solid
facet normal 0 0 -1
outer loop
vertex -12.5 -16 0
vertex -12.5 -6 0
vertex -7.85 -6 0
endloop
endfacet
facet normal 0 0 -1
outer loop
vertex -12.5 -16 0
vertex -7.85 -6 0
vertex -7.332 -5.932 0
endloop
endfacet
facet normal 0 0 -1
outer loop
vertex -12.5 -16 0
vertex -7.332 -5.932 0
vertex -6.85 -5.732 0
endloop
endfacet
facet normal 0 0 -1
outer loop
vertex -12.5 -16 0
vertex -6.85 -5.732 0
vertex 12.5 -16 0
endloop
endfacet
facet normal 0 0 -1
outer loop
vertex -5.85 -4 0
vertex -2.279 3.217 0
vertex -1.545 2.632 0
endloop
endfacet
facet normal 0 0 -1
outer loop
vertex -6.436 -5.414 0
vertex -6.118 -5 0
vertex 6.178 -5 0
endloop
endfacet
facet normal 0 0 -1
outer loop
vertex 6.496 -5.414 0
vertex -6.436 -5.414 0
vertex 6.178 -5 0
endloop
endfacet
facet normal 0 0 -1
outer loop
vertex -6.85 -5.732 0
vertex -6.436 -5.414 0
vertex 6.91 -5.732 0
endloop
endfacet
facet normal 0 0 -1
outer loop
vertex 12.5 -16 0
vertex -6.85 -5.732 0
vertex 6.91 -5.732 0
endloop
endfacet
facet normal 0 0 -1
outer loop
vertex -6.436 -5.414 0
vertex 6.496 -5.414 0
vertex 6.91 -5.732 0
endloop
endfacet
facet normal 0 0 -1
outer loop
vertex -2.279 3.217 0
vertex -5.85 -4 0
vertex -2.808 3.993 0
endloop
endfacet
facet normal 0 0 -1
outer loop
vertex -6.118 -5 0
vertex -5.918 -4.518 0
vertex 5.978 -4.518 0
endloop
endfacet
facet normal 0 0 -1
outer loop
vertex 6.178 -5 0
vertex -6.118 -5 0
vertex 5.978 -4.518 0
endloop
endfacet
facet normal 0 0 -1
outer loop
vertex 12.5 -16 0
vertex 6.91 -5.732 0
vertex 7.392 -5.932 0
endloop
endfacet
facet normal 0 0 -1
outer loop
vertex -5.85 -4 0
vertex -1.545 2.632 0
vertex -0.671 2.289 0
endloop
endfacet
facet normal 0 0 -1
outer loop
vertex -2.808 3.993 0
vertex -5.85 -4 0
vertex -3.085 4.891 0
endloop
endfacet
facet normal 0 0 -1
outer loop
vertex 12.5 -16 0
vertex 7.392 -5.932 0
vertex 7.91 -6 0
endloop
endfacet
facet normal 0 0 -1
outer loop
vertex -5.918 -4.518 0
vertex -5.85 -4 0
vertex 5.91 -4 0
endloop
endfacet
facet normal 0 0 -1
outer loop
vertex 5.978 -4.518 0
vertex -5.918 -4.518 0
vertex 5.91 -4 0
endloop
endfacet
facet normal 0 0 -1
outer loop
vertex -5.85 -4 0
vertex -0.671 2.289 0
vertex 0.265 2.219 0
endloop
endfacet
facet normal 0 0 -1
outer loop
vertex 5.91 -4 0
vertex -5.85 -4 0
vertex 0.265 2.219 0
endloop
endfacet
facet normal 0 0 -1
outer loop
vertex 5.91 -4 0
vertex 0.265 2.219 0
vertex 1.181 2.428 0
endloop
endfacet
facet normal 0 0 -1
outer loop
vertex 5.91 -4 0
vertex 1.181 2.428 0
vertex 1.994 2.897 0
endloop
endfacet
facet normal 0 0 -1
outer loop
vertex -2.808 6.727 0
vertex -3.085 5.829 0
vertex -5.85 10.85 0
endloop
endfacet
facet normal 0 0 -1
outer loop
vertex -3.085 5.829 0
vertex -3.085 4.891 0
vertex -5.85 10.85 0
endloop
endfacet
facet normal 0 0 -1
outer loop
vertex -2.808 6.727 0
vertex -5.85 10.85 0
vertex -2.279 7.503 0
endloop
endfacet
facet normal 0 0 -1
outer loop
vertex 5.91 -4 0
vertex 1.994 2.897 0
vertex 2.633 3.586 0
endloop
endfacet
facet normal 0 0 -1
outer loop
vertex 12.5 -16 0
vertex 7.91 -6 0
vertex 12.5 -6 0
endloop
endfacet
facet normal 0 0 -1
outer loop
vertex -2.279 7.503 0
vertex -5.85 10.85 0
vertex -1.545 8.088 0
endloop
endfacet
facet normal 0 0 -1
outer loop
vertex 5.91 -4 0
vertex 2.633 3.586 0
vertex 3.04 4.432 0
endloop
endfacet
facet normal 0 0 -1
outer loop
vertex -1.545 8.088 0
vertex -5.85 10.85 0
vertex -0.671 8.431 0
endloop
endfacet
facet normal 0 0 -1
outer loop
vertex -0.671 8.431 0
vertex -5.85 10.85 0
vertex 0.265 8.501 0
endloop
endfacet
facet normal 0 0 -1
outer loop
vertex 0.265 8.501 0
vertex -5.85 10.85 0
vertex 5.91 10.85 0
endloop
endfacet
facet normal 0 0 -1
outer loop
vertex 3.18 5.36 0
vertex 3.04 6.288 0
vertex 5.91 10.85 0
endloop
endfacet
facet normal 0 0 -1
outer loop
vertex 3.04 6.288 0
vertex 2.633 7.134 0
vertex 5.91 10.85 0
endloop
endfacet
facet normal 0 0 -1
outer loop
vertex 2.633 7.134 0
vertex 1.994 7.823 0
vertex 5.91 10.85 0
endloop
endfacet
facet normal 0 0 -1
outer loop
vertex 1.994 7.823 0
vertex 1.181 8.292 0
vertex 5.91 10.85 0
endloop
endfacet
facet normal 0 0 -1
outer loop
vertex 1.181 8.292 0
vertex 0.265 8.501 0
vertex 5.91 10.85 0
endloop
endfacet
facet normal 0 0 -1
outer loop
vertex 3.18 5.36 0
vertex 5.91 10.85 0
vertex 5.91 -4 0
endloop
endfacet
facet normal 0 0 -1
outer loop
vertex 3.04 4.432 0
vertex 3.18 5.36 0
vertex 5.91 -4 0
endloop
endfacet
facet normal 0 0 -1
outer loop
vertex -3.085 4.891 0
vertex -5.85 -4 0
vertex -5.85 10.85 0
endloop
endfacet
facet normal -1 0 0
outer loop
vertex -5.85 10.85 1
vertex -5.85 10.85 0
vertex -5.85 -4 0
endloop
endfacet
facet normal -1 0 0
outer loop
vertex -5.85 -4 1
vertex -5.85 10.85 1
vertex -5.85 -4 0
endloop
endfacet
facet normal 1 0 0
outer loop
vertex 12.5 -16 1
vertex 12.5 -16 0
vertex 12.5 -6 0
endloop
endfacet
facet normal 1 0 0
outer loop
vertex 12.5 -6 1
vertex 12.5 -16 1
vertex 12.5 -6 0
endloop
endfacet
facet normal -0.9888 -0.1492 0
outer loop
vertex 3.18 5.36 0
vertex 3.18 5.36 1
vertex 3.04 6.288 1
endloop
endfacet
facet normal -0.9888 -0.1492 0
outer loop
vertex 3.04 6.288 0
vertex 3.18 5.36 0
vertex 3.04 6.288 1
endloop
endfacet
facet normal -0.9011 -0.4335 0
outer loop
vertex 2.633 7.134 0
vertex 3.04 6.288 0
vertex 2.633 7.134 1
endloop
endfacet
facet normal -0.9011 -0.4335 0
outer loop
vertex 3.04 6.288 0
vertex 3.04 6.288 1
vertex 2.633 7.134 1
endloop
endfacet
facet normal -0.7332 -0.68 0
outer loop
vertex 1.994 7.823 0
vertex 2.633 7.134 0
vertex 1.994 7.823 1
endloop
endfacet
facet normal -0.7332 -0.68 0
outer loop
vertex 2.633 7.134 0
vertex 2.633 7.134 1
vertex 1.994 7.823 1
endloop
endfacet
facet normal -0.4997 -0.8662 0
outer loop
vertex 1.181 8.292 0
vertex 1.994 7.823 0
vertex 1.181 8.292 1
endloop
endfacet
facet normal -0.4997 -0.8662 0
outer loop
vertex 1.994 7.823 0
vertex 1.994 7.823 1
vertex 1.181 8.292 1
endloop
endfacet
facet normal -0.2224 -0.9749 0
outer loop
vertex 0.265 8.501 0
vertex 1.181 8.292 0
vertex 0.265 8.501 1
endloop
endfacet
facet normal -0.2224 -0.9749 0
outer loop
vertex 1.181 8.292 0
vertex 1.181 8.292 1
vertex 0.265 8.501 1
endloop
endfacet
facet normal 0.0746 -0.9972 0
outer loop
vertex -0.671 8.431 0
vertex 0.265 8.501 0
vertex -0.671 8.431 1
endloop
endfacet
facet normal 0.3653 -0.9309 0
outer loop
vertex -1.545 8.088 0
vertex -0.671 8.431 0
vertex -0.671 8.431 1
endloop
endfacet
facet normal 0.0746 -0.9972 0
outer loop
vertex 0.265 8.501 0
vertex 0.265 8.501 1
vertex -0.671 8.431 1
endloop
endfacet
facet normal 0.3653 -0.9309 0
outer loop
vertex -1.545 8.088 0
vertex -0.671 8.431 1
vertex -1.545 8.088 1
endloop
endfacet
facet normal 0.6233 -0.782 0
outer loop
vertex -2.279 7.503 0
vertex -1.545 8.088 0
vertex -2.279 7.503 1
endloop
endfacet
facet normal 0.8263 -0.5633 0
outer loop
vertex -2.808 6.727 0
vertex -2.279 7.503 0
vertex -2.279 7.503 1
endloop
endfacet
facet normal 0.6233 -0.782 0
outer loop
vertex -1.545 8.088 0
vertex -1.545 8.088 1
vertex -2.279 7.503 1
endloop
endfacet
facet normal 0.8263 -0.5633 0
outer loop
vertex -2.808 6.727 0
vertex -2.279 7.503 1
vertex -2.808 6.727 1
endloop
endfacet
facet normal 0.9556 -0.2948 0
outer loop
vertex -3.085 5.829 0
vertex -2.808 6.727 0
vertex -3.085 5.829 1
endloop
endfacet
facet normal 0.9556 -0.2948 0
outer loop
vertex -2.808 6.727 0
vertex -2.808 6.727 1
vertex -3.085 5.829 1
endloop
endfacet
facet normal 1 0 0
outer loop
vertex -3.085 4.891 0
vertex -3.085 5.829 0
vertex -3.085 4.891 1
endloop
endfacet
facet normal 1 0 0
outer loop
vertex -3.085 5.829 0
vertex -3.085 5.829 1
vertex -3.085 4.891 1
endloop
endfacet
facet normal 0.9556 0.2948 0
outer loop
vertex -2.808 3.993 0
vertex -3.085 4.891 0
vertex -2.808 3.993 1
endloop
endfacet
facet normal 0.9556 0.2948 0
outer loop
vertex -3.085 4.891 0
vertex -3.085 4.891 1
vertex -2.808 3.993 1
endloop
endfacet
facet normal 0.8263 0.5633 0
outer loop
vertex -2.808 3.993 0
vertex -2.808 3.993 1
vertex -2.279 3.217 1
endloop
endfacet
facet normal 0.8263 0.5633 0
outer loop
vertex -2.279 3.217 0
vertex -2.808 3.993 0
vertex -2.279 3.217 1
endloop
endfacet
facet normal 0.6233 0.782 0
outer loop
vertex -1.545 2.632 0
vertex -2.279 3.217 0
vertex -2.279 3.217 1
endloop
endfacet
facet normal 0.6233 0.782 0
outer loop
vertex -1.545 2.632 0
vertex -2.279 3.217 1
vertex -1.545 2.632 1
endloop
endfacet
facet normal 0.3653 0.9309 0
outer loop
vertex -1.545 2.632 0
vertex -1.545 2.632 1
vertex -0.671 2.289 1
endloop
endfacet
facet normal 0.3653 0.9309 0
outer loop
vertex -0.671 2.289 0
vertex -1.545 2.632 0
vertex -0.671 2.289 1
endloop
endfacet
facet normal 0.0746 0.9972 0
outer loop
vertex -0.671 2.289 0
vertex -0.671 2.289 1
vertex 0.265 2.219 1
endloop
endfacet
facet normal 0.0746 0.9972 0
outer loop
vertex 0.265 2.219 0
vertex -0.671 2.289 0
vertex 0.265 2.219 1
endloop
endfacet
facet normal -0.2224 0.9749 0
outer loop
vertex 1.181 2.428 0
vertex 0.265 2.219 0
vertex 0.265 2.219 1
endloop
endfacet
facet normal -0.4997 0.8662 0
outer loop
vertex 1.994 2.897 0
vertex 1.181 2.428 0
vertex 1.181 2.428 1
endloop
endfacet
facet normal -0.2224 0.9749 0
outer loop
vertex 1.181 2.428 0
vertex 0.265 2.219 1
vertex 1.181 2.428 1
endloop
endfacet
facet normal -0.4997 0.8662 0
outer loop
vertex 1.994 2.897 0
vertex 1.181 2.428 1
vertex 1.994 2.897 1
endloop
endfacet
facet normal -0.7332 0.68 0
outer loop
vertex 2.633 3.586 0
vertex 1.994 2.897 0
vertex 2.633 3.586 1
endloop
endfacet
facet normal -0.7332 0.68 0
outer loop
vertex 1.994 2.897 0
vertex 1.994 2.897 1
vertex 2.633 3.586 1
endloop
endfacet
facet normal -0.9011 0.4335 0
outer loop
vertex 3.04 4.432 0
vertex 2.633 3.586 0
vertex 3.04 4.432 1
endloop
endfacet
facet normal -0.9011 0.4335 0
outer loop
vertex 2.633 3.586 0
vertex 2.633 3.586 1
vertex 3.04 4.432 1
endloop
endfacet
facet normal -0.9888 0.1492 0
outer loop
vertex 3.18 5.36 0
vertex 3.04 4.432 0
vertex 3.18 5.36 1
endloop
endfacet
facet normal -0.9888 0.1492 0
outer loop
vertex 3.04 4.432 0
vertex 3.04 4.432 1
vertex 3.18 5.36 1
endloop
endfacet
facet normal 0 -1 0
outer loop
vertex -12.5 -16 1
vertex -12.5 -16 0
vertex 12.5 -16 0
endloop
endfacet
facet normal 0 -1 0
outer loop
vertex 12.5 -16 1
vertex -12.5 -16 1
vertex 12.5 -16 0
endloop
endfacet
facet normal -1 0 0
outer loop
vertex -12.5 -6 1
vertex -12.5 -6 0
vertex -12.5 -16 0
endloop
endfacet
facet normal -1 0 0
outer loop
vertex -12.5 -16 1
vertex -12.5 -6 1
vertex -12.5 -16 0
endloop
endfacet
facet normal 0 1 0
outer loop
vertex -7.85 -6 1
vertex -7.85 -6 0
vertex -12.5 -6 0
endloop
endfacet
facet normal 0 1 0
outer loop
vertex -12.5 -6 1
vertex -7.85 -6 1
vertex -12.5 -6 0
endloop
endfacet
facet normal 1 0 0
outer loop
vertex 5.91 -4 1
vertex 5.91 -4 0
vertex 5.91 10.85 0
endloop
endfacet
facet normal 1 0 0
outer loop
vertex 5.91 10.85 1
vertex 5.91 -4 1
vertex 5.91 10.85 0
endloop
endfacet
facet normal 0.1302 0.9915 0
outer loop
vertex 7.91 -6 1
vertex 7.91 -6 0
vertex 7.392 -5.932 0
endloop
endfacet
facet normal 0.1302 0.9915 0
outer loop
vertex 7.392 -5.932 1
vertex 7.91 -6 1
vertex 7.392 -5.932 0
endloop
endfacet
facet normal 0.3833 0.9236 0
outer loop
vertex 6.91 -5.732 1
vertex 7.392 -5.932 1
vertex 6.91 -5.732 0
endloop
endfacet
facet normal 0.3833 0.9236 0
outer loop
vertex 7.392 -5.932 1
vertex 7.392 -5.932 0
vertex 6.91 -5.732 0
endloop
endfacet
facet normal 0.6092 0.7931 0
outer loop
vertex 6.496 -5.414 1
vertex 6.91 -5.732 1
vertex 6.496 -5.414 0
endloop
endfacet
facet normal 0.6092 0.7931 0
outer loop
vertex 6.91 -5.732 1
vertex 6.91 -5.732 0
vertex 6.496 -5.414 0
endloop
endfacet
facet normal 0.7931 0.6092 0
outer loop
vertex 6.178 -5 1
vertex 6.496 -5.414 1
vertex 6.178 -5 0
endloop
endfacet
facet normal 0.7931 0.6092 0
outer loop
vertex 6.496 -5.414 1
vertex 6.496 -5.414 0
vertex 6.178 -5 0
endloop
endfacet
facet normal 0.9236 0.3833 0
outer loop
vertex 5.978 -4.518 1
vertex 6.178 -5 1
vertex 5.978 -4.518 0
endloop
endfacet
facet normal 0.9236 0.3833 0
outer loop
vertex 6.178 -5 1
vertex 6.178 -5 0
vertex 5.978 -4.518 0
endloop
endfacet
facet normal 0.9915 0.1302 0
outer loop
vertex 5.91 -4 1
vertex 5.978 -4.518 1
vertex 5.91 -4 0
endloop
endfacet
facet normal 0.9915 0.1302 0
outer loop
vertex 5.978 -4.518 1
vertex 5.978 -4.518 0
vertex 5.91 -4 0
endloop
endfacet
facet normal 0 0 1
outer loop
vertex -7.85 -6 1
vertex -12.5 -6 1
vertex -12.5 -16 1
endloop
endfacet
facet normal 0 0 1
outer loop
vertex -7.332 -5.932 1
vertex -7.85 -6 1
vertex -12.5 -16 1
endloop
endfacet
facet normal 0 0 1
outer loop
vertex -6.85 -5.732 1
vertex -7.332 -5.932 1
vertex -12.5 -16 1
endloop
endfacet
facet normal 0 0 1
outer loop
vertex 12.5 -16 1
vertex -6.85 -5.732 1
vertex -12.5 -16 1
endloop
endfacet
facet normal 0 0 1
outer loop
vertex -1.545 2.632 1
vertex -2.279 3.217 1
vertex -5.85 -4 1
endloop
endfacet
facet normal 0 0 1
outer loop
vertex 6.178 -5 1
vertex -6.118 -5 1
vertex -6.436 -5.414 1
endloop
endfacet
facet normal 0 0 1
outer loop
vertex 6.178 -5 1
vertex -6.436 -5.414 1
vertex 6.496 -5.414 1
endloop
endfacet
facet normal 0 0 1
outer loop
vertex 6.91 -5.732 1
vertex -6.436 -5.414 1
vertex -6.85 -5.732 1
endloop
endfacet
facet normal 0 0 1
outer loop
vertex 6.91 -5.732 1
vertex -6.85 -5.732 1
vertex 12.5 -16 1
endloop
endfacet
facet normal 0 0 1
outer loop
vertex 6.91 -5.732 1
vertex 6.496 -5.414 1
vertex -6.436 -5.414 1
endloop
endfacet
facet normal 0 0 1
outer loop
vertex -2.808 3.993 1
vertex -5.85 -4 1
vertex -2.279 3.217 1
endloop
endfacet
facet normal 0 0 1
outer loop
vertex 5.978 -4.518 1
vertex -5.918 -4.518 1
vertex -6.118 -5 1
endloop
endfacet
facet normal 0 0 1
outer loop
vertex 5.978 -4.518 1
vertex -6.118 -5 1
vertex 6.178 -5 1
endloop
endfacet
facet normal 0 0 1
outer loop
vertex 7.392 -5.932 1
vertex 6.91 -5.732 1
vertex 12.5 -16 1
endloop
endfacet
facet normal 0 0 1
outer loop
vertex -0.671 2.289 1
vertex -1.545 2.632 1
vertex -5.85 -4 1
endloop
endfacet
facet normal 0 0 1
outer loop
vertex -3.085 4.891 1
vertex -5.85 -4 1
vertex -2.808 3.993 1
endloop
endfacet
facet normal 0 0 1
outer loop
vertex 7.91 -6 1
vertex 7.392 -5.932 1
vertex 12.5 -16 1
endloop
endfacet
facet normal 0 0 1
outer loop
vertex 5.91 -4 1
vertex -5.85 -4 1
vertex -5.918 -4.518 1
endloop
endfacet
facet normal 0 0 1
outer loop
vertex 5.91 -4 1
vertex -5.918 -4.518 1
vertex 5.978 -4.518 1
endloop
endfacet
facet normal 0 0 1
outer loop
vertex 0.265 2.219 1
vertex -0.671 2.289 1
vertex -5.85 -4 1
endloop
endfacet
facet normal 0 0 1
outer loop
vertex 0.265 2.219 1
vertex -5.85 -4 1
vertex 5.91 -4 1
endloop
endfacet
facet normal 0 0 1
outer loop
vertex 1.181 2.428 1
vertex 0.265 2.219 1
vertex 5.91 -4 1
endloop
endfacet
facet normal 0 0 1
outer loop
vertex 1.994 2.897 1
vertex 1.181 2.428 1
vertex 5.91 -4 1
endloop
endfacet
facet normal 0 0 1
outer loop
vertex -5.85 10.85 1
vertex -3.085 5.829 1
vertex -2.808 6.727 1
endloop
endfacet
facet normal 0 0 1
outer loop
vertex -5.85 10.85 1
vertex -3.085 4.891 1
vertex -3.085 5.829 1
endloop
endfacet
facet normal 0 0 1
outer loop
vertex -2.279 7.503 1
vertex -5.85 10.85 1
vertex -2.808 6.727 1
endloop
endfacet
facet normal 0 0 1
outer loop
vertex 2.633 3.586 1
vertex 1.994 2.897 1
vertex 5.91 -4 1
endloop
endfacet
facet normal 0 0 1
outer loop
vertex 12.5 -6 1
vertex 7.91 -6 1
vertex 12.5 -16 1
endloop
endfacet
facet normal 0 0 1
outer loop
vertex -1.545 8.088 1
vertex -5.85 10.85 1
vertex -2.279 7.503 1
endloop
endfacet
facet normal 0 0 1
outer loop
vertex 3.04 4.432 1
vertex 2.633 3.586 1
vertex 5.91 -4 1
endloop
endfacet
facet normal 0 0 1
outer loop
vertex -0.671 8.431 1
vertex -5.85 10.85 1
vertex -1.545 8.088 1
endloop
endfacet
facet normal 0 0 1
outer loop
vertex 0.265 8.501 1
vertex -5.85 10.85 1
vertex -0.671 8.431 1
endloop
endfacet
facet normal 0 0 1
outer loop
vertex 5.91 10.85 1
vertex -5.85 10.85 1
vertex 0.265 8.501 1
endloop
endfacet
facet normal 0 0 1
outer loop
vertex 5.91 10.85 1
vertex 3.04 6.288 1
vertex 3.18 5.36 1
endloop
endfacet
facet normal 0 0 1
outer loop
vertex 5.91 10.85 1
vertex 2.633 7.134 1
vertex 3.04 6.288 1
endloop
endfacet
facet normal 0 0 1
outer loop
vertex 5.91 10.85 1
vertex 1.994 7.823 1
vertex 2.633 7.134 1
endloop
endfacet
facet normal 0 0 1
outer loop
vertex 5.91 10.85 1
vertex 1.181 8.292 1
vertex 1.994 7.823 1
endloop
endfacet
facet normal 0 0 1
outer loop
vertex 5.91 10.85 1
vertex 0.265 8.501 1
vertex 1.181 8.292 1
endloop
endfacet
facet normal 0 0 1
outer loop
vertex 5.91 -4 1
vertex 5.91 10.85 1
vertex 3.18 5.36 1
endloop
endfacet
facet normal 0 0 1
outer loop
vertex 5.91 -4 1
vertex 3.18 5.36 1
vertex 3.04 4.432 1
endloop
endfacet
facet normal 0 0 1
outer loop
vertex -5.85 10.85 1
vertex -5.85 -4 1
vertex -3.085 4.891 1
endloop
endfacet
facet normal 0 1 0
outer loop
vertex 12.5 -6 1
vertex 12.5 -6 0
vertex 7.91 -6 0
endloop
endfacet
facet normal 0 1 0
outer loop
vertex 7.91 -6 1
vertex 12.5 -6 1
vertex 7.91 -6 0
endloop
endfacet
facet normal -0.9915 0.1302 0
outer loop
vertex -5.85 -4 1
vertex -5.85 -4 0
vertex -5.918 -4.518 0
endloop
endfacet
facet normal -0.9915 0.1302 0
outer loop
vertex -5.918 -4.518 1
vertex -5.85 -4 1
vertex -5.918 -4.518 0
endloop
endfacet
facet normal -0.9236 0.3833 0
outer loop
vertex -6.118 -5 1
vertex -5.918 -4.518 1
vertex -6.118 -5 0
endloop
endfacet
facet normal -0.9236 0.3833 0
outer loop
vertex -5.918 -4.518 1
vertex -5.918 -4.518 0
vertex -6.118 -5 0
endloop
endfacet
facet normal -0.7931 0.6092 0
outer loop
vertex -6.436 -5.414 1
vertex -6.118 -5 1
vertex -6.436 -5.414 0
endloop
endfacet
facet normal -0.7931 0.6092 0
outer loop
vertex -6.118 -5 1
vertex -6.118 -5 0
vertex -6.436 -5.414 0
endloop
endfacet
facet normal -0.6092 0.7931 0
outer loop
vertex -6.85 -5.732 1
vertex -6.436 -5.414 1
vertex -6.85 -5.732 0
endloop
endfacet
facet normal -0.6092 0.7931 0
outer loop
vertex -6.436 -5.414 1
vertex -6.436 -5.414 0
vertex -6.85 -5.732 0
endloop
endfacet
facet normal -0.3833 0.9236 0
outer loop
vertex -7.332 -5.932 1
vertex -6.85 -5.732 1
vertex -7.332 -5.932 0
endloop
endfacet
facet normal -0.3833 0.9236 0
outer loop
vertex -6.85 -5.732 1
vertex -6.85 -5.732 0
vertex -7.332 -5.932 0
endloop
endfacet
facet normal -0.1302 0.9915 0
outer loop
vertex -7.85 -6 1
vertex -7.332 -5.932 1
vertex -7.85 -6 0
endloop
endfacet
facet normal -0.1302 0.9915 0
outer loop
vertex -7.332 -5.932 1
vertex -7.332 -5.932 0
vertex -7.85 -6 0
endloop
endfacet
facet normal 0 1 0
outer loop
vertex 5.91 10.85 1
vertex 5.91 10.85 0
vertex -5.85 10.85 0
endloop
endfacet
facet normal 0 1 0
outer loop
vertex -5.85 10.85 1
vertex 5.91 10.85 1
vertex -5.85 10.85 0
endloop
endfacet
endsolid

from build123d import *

# Parameters (mm, degrees)
DODANIE_WYCI_GNI_CIE1_DEPTH = 1
SZKIC2_R                    = 3.15
WYTNIJ_WYCI_GNI_CIE1_DEPTH  = 1


with BuildPart() as part:
    # Szkic1 → Dodanie-wyciągnięcie1 (new body)
    with BuildSketch(Plane.XY):
        with BuildLine():
            Line((-12.5, -6), (-12.5, -16))
            Line((-12.5, -16), (12.5, -16))
            Line((12.5, -16), (12.5, -6))
            Line((12.5, -6), (7.91, -6))
            ThreePointArc((7.91, -6), (6.495786438, -5.414213562), (5.91, -4))
            Line((5.91, -4), (5.91, 5.45))
            Line((5.91, 5.45), (5.91, 6.85))
            Line((5.91, 6.85), (5.91, 10.85))
            Line((5.91, 10.85), (-5.85, 10.85))
            Line((-5.85, 10.85), (-5.85, 6.85))
            Line((-5.85, 6.85), (-5.85, 5.45))
            Line((-5.85, 5.45), (-5.85, -4))
            ThreePointArc((-5.85, -4), (-6.435786438, -5.414213562), (-7.85, -6))
            Line((-7.85, -6), (-12.5, -6))
        make_face()
    extrude(amount=DODANIE_WYCI_GNI_CIE1_DEPTH)

    # Szkic2 → Wytnij-wyciągnięcie1 (cut)
    with BuildSketch(Plane.XY.offset(1)):
        with Locations((0.03, 5.36)):
            Circle(SZKIC2_R)
    extrude(amount=-WYTNIJ_WYCI_GNI_CIE1_DEPTH, mode=Mode.SUBTRACT)


solid = part.part
